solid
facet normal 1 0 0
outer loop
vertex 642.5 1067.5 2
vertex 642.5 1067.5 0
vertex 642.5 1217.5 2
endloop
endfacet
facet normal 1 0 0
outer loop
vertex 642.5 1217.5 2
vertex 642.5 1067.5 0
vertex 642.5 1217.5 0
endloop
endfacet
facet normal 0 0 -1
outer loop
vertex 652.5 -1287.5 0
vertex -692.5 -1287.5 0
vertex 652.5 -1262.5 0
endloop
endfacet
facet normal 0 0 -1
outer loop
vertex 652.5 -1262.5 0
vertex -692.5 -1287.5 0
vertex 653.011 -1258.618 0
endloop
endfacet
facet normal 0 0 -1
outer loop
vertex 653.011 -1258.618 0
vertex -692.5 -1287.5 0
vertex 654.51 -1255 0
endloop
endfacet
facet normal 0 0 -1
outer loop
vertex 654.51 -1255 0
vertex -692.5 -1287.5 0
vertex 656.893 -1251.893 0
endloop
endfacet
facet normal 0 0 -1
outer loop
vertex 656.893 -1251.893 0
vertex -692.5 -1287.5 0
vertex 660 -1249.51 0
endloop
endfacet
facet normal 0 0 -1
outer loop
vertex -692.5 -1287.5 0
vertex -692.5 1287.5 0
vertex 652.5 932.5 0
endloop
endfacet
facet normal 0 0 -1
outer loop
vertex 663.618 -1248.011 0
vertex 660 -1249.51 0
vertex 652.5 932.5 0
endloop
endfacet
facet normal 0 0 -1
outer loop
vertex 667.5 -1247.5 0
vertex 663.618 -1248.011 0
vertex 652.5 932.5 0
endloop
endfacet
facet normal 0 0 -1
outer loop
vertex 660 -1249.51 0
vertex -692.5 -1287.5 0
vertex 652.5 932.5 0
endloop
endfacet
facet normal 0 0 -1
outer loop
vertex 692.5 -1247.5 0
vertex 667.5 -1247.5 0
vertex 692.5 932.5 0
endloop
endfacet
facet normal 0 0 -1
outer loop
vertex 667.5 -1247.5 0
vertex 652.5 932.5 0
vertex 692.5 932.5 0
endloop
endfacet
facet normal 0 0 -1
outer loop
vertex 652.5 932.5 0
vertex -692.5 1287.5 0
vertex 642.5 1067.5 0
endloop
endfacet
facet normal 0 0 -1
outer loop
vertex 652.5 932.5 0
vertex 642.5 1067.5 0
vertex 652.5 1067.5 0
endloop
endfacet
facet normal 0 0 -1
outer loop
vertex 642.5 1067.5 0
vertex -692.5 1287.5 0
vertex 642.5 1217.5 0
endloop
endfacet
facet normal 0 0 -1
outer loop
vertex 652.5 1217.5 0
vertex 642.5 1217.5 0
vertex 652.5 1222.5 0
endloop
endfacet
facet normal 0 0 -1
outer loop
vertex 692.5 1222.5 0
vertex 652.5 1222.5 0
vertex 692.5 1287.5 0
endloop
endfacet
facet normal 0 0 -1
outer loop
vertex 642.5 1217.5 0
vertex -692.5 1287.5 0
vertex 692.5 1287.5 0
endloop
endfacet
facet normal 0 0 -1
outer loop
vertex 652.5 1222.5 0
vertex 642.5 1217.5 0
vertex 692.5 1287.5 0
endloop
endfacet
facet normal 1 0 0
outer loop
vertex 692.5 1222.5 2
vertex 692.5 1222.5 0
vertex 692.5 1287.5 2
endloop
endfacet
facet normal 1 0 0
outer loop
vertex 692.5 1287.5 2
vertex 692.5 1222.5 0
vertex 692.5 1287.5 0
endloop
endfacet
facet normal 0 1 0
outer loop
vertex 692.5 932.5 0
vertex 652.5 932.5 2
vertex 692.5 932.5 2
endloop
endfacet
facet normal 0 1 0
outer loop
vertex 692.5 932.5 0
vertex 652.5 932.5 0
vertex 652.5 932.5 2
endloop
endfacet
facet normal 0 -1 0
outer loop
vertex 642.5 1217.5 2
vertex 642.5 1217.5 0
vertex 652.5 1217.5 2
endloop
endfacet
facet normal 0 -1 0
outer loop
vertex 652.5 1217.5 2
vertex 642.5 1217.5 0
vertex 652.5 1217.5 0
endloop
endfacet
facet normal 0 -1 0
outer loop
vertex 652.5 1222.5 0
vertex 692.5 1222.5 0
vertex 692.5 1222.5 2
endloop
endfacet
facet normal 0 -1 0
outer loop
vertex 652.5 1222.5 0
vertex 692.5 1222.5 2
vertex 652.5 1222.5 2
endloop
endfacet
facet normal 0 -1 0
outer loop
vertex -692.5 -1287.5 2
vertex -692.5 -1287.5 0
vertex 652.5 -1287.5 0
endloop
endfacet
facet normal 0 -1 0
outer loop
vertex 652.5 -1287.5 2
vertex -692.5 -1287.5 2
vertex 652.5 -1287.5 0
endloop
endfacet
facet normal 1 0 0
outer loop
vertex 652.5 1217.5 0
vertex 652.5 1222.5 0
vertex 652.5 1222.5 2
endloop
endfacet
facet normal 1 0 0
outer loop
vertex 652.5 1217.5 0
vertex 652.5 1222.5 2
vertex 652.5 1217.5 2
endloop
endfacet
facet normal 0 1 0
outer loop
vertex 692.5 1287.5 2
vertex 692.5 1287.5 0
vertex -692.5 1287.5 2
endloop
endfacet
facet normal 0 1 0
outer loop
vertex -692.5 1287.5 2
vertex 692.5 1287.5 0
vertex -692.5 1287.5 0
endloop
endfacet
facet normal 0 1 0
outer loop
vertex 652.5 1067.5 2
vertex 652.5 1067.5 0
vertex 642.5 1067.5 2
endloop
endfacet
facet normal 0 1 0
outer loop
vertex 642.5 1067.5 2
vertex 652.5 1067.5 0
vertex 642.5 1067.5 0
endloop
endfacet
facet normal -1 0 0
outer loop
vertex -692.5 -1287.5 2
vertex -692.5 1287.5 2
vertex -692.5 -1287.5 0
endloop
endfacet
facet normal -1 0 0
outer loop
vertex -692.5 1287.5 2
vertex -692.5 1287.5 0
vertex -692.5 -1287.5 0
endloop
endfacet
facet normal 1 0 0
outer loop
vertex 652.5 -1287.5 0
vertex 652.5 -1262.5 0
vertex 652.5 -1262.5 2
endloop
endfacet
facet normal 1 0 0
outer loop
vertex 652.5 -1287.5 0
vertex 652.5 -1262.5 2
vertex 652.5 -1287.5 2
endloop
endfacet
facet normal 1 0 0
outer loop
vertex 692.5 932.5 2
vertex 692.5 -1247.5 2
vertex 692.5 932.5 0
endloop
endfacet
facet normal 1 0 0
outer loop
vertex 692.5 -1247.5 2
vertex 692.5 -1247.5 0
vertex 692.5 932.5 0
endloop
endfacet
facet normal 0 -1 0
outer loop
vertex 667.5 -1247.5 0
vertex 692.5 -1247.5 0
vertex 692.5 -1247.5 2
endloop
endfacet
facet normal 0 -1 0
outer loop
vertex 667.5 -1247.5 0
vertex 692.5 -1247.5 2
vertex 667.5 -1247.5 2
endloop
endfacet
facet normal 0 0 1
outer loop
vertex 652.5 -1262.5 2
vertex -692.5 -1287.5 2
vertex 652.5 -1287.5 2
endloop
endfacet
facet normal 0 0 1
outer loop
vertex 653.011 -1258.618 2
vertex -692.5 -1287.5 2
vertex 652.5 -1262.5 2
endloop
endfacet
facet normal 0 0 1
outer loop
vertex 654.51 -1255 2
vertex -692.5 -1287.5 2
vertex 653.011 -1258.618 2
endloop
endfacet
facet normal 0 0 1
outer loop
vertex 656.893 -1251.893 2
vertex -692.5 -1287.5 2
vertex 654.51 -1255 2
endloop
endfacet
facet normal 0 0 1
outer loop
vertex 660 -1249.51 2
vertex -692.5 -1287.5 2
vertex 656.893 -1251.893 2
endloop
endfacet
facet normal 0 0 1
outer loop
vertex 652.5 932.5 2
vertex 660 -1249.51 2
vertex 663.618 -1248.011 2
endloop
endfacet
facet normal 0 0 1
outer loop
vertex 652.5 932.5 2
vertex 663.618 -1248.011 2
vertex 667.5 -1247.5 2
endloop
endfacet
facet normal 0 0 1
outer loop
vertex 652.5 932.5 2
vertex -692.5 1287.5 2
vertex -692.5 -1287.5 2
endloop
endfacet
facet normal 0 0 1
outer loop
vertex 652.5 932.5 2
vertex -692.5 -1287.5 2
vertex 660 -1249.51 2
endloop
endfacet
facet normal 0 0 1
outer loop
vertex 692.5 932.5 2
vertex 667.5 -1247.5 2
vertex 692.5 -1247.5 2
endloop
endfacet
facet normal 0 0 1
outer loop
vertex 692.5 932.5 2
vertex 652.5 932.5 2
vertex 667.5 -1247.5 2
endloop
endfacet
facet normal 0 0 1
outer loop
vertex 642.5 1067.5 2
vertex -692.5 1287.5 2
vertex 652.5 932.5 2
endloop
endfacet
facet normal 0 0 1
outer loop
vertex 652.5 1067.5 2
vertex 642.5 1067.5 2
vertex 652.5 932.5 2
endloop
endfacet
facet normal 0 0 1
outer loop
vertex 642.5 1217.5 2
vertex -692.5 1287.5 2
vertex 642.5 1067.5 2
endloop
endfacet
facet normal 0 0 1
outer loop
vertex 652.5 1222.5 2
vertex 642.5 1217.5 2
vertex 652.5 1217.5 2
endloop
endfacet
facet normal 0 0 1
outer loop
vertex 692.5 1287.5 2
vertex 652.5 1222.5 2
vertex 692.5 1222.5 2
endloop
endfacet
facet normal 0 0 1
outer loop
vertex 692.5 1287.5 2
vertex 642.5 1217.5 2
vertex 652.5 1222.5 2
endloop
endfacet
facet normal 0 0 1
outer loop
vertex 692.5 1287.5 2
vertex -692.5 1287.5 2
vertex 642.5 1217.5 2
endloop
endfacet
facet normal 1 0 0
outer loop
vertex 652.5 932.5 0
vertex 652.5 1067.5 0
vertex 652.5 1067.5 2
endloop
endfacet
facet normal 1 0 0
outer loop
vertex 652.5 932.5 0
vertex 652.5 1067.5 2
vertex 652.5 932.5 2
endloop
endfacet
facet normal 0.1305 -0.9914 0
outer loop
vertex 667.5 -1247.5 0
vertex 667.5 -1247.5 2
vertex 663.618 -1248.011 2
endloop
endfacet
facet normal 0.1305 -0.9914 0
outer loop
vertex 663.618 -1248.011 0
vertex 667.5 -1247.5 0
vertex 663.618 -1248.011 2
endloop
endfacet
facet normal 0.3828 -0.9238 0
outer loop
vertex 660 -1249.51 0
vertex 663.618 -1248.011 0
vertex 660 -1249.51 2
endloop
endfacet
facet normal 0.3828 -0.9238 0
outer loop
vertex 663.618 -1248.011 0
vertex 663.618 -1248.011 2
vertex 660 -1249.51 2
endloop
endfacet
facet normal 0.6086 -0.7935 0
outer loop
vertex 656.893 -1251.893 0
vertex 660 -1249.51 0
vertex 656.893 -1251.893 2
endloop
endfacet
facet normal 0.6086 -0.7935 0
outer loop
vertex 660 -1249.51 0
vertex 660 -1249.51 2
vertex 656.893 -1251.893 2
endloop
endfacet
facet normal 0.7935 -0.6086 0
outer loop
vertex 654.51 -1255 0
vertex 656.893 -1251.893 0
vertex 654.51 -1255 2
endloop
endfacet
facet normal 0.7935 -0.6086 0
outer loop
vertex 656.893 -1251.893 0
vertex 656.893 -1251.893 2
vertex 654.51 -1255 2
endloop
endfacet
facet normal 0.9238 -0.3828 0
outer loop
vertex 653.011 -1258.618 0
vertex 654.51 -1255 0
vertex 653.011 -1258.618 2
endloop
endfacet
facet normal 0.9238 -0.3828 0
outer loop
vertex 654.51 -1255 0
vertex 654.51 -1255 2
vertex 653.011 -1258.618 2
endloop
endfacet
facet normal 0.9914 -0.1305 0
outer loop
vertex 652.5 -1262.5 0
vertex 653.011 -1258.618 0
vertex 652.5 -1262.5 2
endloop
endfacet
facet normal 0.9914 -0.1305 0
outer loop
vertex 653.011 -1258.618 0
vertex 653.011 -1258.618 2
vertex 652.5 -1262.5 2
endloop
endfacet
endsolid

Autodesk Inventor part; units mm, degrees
ref_plane "YZ Plane" through (0, 0, 0) normal (1, 0, 0) x (0, 1, 0)
ref_plane "XZ Plane" through (0, 0, 0) normal (0, 1, 0) x (-1, 0, 0)
ref_plane "XY Plane" through (0, 0, 0) normal (0, 0, 1) x (1, 0, 0)
sketch "Sketch1" plane through (0, 0, 0) normal (0, 0, 1) x (1, 0, 0)
  line L0 (-692.5, -1287.5) -> (692.5, -1287.5)
  line L1 (692.5, -1287.5) -> (692.5, 1287.5)
  line L2 (692.5, 1287.5) -> (-692.5, 1287.5)
  line L3 (-692.5, 1287.5) -> (-692.5, -1287.5)
  line L4 (-692.5, -1287.5) -> (692.5, 1287.5) construction
  line L5 (692.5, -1287.5) -> (-692.5, 1287.5) construction
  line L6 (692.5, -1247.5) -> (652.5, -1247.5)
  line L7 (652.5, -1247.5) -> (652.5, -1287.5)
  line L8 (692.5, 1222.5) -> (652.5, 1222.5)
  line L9 (652.5, 1222.5) -> (652.5, 932.5)
  line L10 (652.5, 932.5) -> (692.5, 932.5)
  line L11 (692.5, 932.5) -> (692.5, 1222.5)
  line L12 (652.5, 1067.5) -> (642.5, 1067.5)
  line L13 (642.5, 1067.5) -> (642.5, 1217.5)
  line L14 (642.5, 1217.5) -> (652.5, 1217.5)
  line L15 (-572.5, -767.5) -> (17.5, -767.5)
  line L16 (17.5, -767.5) -> (17.5, -177.5)
  line L17 (17.5, -177.5) -> (-572.5, -177.5)
  line L18 (-572.5, -177.5) -> (-572.5, -767.5)
  point P0 (0, 0)
  dimension "d154" = 1385
  dimension "d155" = 2575
  dimension "d157" = 40
  dimension "d159" = 290
  dimension "d161" = 40
  dimension "d162" = 2220
  dimension "d163" = 10
  dimension "d164" = 150
  dimension "d165" = 5
  dimension "d166" = 590
  dimension "d167" = 590
  dimension "d168" = 675
  dimension "d169" = 520
extrude "Plate5" add sketch "Sketch1" along normal blind 2 contours L3 L2 L1 L8 L9 L14 L13 L12 L10 L6 L7 L0 | L18 L17 L16 L15
fillet "Corner Round1" radius 15 1 edges at (652.5, -1247.5, 1)
properties part number "PNS-0111 floor sheet 2_CPY" material "Stainless Steel"
